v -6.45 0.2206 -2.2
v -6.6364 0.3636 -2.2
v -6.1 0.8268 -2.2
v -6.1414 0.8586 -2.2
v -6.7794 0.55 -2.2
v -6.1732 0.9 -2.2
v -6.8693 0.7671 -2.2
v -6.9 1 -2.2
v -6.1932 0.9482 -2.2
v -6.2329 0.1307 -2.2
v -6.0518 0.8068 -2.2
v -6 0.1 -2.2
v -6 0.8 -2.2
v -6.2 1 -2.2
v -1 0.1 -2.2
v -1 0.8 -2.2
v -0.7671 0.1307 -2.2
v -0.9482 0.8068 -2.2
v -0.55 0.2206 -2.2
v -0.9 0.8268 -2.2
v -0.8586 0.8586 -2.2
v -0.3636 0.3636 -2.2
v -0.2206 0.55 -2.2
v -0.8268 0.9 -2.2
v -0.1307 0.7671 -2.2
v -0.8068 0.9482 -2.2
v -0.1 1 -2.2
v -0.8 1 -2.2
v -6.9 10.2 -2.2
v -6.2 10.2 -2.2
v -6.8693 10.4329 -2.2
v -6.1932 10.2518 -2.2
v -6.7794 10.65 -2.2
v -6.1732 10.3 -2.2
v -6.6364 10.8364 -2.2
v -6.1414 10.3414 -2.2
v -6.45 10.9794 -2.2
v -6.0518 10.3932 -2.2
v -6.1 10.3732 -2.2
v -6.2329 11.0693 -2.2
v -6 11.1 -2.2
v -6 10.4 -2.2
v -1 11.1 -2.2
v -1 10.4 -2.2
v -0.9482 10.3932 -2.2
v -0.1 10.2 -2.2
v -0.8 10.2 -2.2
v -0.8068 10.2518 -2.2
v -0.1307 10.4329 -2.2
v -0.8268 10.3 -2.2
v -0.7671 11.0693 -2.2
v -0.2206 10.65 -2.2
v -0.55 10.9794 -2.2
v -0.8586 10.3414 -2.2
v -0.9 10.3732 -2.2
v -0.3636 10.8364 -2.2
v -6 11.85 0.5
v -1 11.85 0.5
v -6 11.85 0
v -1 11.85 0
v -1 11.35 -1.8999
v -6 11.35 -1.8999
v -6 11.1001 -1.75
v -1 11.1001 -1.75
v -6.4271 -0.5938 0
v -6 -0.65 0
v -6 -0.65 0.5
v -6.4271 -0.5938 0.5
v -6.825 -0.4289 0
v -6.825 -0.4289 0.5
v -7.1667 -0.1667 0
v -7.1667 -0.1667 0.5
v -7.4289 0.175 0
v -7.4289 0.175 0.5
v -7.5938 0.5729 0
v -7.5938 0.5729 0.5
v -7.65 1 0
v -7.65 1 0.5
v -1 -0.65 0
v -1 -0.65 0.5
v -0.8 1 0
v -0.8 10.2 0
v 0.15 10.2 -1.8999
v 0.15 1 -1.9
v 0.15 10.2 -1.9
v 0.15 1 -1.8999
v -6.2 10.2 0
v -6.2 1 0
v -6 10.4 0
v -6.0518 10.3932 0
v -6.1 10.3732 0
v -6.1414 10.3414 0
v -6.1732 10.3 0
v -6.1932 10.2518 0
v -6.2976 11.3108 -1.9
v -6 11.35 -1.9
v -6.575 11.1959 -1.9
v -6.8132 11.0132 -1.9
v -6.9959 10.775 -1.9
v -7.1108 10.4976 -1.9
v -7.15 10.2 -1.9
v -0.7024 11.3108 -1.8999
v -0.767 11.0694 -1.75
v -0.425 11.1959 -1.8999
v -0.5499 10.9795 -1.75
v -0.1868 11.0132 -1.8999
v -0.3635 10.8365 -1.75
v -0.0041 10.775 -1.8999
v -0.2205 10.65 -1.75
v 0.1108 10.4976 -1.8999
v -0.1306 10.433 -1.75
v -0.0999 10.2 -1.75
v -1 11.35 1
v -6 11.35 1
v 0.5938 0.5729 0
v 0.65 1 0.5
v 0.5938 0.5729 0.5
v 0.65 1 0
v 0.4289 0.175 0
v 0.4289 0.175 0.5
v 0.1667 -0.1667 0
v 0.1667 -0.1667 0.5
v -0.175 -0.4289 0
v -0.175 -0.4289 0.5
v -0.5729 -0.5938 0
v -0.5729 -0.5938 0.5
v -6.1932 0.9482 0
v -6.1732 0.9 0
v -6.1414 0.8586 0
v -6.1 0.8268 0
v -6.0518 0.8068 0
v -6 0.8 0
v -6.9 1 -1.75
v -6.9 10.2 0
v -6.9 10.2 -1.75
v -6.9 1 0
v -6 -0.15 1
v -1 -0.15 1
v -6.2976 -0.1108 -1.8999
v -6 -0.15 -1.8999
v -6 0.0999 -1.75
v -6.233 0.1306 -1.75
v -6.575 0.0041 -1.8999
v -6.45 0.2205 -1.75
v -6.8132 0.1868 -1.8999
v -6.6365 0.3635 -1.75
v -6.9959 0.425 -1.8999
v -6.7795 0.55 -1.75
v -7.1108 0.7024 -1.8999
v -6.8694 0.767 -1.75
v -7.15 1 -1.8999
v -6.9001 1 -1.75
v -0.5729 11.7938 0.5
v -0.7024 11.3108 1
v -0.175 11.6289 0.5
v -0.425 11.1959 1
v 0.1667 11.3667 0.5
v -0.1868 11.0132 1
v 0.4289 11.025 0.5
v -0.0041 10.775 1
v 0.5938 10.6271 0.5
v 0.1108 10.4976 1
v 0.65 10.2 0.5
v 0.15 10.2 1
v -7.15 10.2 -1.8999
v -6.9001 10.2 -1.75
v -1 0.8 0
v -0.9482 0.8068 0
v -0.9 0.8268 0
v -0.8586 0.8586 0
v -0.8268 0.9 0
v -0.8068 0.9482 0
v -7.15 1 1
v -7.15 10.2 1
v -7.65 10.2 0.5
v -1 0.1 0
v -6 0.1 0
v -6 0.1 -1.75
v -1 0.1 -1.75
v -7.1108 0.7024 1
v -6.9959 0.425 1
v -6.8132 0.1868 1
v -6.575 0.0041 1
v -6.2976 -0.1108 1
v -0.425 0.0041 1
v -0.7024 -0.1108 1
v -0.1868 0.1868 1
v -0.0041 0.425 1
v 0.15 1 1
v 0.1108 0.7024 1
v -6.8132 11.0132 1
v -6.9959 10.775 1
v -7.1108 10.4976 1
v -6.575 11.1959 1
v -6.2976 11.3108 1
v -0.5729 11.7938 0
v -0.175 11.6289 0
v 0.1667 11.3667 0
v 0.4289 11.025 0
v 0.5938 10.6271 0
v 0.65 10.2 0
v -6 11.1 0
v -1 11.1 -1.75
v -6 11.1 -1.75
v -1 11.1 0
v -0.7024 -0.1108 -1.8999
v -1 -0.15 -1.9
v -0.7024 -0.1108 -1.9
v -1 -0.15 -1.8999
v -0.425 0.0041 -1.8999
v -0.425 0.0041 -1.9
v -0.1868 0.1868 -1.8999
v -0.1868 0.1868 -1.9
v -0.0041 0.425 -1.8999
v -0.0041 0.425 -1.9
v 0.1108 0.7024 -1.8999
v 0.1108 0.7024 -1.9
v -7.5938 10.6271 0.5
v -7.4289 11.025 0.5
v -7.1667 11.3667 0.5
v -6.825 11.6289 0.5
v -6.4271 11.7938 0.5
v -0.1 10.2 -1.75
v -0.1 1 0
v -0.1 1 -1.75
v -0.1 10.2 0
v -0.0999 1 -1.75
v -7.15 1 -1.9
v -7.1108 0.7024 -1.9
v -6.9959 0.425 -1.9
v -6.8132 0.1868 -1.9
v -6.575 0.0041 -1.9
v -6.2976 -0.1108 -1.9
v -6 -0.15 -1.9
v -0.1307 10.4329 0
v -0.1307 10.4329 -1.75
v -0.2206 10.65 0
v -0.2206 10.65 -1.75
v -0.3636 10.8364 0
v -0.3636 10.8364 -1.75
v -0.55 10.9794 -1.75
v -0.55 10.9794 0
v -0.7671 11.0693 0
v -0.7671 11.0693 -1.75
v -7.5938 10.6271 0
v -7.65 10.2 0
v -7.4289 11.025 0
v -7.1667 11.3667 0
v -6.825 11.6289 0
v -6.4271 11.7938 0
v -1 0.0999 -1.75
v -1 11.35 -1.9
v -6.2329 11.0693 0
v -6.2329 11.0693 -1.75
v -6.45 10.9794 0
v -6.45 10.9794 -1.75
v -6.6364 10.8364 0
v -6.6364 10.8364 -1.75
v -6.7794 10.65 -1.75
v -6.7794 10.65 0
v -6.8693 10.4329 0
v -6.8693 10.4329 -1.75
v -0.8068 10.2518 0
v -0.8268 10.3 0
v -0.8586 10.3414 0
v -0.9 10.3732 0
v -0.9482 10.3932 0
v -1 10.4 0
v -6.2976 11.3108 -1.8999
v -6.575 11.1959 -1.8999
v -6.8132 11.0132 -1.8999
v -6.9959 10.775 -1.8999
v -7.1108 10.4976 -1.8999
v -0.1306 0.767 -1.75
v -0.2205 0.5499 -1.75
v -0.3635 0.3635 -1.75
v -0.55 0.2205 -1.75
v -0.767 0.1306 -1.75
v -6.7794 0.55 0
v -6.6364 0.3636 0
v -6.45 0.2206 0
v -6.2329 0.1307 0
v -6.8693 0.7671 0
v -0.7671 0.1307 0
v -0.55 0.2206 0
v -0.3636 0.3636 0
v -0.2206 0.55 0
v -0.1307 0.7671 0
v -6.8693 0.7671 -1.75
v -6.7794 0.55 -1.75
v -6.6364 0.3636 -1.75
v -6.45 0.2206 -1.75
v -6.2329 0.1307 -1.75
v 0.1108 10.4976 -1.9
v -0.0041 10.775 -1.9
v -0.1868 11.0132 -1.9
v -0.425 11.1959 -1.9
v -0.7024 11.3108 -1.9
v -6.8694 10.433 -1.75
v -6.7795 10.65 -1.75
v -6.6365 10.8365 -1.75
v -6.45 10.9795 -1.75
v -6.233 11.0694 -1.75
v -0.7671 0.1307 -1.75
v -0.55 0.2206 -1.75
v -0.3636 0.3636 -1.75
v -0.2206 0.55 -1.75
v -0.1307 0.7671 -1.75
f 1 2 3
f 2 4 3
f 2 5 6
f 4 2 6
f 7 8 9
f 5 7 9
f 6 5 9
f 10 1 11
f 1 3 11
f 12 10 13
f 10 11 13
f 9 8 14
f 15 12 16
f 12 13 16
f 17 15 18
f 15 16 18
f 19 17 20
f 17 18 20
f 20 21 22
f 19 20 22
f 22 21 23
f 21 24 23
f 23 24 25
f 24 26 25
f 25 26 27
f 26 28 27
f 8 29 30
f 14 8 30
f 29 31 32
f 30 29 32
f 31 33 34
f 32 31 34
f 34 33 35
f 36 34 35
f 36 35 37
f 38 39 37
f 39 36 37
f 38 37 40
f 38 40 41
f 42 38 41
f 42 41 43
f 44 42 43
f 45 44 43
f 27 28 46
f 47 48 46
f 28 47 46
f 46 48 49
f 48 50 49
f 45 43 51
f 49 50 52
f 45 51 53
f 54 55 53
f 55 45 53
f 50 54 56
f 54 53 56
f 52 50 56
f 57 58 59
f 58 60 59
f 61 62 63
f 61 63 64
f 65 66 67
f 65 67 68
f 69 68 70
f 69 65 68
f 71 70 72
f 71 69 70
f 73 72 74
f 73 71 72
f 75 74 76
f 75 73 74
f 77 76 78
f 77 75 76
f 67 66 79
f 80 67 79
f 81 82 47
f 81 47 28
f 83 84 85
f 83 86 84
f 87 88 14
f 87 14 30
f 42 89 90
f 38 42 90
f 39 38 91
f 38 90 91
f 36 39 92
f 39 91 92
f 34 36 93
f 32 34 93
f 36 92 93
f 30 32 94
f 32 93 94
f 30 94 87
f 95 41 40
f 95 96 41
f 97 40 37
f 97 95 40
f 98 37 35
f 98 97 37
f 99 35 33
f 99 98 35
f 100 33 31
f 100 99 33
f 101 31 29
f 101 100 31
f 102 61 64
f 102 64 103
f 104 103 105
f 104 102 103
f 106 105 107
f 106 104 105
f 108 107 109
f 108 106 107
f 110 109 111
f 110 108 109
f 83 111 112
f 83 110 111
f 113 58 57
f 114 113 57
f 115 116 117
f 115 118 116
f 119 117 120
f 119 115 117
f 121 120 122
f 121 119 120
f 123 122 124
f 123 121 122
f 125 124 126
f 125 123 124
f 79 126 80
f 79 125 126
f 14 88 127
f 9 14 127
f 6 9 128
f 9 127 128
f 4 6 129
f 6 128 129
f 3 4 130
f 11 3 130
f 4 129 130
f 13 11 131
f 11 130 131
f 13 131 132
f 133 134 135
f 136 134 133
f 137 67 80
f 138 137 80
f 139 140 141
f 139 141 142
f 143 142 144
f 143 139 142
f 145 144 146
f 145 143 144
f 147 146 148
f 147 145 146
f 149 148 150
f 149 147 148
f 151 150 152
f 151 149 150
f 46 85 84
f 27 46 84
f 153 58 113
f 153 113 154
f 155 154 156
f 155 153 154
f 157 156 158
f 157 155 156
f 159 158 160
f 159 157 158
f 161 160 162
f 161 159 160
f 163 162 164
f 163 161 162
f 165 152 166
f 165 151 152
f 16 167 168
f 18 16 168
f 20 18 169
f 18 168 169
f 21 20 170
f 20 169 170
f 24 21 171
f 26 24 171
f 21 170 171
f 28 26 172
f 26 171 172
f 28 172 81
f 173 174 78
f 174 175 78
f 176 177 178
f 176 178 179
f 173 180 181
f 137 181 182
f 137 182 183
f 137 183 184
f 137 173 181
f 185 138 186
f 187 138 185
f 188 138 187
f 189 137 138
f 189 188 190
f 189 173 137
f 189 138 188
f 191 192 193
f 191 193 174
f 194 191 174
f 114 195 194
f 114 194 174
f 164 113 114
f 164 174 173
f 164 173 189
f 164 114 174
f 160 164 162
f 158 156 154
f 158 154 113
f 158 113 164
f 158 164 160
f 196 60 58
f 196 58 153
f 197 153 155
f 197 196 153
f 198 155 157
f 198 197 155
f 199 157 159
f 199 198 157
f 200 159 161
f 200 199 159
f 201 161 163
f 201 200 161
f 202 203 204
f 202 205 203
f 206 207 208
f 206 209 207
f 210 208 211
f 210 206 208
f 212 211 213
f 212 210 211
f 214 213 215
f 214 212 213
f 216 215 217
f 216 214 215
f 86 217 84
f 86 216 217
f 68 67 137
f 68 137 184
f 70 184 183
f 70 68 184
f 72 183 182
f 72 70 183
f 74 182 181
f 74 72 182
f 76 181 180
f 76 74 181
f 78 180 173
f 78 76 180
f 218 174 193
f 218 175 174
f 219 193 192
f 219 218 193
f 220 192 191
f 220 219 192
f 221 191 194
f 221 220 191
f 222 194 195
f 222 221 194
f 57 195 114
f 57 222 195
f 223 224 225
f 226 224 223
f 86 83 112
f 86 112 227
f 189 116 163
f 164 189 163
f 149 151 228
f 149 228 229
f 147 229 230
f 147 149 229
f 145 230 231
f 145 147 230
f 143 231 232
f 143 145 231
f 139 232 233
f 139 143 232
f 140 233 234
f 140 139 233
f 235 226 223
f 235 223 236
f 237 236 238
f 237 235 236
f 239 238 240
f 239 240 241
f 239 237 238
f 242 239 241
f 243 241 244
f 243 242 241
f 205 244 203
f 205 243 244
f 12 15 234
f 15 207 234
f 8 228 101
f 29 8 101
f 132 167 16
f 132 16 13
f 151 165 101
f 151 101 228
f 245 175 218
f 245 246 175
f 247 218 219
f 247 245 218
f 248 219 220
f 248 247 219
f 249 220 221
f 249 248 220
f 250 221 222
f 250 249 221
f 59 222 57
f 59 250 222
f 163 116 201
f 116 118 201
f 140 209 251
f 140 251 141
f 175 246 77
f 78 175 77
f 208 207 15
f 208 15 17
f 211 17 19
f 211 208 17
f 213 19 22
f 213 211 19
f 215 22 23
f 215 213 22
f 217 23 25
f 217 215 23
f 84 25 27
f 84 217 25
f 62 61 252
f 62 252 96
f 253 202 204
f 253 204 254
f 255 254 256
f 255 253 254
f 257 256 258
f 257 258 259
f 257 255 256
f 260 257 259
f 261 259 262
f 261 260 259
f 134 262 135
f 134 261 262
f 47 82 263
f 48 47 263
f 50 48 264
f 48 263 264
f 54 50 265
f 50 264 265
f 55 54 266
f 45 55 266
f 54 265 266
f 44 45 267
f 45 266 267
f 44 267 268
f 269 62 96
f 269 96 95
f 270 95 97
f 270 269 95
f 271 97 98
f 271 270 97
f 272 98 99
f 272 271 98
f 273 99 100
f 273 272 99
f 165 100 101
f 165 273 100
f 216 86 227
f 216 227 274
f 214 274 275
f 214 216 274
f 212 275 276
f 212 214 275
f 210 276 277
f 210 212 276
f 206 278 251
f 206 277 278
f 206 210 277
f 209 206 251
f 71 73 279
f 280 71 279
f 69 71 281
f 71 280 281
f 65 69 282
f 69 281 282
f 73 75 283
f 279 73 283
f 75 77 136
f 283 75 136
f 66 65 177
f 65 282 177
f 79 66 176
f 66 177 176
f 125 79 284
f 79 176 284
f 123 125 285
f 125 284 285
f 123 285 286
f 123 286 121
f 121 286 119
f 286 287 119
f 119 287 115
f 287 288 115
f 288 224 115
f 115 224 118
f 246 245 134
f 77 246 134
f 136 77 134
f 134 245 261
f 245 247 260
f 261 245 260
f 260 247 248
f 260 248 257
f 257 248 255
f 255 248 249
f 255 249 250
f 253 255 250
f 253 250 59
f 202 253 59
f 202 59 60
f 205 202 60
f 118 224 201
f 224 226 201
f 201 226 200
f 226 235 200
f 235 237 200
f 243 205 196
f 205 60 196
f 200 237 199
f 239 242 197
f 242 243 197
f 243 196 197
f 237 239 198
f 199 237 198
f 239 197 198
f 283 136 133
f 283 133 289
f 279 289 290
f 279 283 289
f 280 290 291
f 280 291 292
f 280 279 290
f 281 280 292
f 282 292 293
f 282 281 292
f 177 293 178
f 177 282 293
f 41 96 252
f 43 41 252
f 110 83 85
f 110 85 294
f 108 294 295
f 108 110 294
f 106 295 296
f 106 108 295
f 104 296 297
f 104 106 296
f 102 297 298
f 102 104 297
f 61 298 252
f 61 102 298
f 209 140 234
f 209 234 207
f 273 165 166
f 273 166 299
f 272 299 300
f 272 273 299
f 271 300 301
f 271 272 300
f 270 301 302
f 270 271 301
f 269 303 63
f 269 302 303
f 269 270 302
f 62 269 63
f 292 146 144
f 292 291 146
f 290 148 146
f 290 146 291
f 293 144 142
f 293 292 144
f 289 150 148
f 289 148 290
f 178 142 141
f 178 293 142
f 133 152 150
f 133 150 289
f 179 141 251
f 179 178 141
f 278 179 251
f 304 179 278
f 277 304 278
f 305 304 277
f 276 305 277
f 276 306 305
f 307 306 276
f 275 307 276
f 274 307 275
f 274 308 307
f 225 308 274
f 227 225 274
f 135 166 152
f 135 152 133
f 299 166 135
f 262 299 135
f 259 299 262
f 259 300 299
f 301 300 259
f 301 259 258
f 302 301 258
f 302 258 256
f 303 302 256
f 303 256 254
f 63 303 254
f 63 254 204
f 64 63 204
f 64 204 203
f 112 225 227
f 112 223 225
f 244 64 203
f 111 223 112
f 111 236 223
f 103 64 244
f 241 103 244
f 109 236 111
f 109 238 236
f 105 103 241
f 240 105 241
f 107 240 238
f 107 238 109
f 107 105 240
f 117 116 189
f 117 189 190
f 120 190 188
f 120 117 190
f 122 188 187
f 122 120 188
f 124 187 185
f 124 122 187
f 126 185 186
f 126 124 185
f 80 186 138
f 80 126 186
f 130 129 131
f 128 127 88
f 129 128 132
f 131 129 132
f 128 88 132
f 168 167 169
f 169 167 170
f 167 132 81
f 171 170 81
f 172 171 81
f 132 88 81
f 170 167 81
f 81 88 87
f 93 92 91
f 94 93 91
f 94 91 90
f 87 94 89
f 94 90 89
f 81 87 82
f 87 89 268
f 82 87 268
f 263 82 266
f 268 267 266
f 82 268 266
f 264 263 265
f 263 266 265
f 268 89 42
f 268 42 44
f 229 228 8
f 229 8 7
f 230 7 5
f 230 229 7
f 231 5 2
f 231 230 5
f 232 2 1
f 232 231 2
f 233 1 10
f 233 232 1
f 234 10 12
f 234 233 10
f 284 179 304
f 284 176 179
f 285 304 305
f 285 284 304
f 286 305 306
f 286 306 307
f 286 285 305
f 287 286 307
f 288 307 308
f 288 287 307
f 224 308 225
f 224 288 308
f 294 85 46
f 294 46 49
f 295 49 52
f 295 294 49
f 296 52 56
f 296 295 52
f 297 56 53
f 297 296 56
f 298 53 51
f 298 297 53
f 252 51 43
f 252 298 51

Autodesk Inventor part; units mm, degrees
ref_plane "YZ Plane" through (0, 0, 0) normal (1, 0, 0) x (0, 1, 0)
ref_plane "XZ Plane" through (0, 0, 0) normal (0, 1, 0) x (-1, 0, 0)
ref_plane "XY Plane" through (0, 0, 0) normal (0, 0, 1) x (1, 0, 0)
sketch "Sketch1" plane through (0, 0, 0) normal (0, 0, 1) x (1, 0, 0)
  line L0 (-1, 0) -> (-6, 0)
  line L1 (-7, 1) -> (-7, 10.2)
  line L2 (-6, 11.2) -> (-1, 11.2)
  line L3 (0, 10.2) -> (0, 1)
  arc A0 (-7, 1) -> (-6, 0) centre (-6, 1) ccw
  arc A1 (-6, 11.2) -> (-7, 10.2) centre (-6, 10.2) ccw
  arc A2 (0, 10.2) -> (-1, 11.2) centre (-1, 10.2) ccw
  arc A3 (-1, 0) -> (0, 1) centre (-1, 1) ccw
  line L4 (-7.65, 10.2) -> (-7.65, 1)
  arc A4 (-7.65, 1) -> (-6, -0.65) centre (-6, 1) ccw
  line L5 (-6, -0.65) -> (-1, -0.65)
  arc A5 (-1, -0.65) -> (0.65, 1) centre (-1, 1) ccw
  line L6 (0.65, 1) -> (0.65, 10.2)
  arc A6 (0.65, 10.2) -> (-1, 11.85) centre (-1, 10.2) ccw
  line L7 (-1, 11.85) -> (-6, 11.85)
  arc A7 (-6, 11.85) -> (-7.65, 10.2) centre (-6, 10.2) ccw
  line L8 (-6.9, 10.2) -> (-6.9, 1)
  arc A8 (-6.9, 1) -> (-6, 0.1) centre (-6, 1) ccw
  line L9 (-6, 0.1) -> (-1, 0.1)
  arc A9 (-1, 0.1) -> (-0.1, 1) centre (-1, 1) ccw
  line L10 (-0.1, 1) -> (-0.1, 10.2)
  arc A10 (-0.1, 10.2) -> (-1, 11.1) centre (-1, 10.2) ccw
  line L11 (-1, 11.1) -> (-6, 11.1)
  arc A11 (-6, 11.1) -> (-6.9, 10.2) centre (-6, 10.2) ccw
  line L12 (-6.2, 1) -> (-6.2, 10.2)
  arc A12 (-6, 10.4) -> (-6.2, 10.2) centre (-6, 10.2) ccw
  line L13 (-6, 10.4) -> (-1, 10.4)
  arc A13 (-0.8, 10.2) -> (-1, 10.4) centre (-1, 10.2) ccw
  line L14 (-0.8, 10.2) -> (-0.8, 1)
  arc A14 (-1, 0.8) -> (-0.8, 1) centre (-1, 1) ccw
  line L15 (-1, 0.8) -> (-6, 0.8)
  arc A15 (-6.2, 1) -> (-6, 0.8) centre (-6, 1) ccw
  line L16 (-7.15, 10.2) -> (-7.15, 1)
  arc A16 (-7.15, 1) -> (-6, -0.15) centre (-6, 1) ccw
  line L17 (-6, -0.15) -> (-1, -0.15)
  arc A17 (-1, -0.15) -> (0.15, 1) centre (-1, 1) ccw
  line L18 (0.15, 1) -> (0.15, 10.2)
  arc A18 (0.15, 10.2) -> (-1, 11.35) centre (-1, 10.2) ccw
  line L19 (-1, 11.35) -> (-6, 11.35)
  arc A19 (-6, 11.35) -> (-7.15, 10.2) centre (-6, 10.2) ccw
  point P0 (0, 0)
  point P1 (-7, 11.2)
  point P2 (-7, 0)
  point P3 (0, 11.2)
  dimension "d0" = 7
  dimension "d1" = 11.2
  dimension "d2" = 1
  dimension "d3" = 0.65
  dimension "d6" = 0.1
  dimension "d9" = 0.7
  dimension "d10" = 0.15
extrude "Extrusion1" add sketch "Sketch1" along normal blind 1 contours L0 A0 L1 A1 L2 A2 L3 A3 | A7 L7 A6 L6 A5 L5 A4 L4 | A11 L11 A10 L10 A9 L9 A8 L8 | L12 A12 L13 A13 L14 A14 L15 A15 | A19 L19 A18 L18 A17 L17 A16 L16
extrude "Extrusion2" add sketch "Sketch1" against normal blind 2.2 contours L0 A0 L1 A1 L2 A2 L3 A3 | A11 L11 A10 L10 A9 L9 A8 L8 | A19 L19 A18 L18 A17 L17 A16 L16
extrude "Extrusion3" cut sketch "Sketch1" against normal blind 1.75 contours L0 A0 L1 A1 L2 A2 L3 A3 | A19 L19 A18 L18 A17 L17 A16 L16
chamfer "Chamfer1" distance 0.25 distance2 0.15 8 edges at (-6.8132, 11.0132, -1.75) (-3.5, 11.35, -1.75) (-0.1868, 11.0132, -1.75) (0.15, 5.6, -1.75) (-0.1868, 0.1868, -1.75) (-3.5, -0.15, -1.75) (-6.8132, 0.1868, -1.75) (-7.15, 5.6, -1.75) measured on face at (-0.0167, 7.1333, -1.75)
chamfer "Chamfer2" distance 0.5 distance2 0.5 8 edges at (-7.65, 5.6, 1) (-7.1667, -0.1667, 1) (-3.5, -0.65, 1) (0.1667, -0.1667, 1) (0.65, 5.6, 1) (0.1667, 11.3667, 1) (-3.5, 11.85, 1) (-7.1667, 11.3667, 1) measured on face at (-2.1167, 4.0667, 1)
chamfer "Chamfer3" distance 0.25 distance2 0.3 8 edges at (-7.15, 5.6, -2.2) (-6.8132, 11.0132, -2.2) (-3.5, 11.35, -2.2) (-0.1868, 11.0132, -2.2) (0.15, 5.6, -2.2) (-0.1868, 0.1868, -2.2) (-3.5, -0.15, -2.2) (-6.8132, 0.1868, -2.2) measured on face at (-0.1667, 4.0667, -2.2)
properties part number "LilypadCover"
